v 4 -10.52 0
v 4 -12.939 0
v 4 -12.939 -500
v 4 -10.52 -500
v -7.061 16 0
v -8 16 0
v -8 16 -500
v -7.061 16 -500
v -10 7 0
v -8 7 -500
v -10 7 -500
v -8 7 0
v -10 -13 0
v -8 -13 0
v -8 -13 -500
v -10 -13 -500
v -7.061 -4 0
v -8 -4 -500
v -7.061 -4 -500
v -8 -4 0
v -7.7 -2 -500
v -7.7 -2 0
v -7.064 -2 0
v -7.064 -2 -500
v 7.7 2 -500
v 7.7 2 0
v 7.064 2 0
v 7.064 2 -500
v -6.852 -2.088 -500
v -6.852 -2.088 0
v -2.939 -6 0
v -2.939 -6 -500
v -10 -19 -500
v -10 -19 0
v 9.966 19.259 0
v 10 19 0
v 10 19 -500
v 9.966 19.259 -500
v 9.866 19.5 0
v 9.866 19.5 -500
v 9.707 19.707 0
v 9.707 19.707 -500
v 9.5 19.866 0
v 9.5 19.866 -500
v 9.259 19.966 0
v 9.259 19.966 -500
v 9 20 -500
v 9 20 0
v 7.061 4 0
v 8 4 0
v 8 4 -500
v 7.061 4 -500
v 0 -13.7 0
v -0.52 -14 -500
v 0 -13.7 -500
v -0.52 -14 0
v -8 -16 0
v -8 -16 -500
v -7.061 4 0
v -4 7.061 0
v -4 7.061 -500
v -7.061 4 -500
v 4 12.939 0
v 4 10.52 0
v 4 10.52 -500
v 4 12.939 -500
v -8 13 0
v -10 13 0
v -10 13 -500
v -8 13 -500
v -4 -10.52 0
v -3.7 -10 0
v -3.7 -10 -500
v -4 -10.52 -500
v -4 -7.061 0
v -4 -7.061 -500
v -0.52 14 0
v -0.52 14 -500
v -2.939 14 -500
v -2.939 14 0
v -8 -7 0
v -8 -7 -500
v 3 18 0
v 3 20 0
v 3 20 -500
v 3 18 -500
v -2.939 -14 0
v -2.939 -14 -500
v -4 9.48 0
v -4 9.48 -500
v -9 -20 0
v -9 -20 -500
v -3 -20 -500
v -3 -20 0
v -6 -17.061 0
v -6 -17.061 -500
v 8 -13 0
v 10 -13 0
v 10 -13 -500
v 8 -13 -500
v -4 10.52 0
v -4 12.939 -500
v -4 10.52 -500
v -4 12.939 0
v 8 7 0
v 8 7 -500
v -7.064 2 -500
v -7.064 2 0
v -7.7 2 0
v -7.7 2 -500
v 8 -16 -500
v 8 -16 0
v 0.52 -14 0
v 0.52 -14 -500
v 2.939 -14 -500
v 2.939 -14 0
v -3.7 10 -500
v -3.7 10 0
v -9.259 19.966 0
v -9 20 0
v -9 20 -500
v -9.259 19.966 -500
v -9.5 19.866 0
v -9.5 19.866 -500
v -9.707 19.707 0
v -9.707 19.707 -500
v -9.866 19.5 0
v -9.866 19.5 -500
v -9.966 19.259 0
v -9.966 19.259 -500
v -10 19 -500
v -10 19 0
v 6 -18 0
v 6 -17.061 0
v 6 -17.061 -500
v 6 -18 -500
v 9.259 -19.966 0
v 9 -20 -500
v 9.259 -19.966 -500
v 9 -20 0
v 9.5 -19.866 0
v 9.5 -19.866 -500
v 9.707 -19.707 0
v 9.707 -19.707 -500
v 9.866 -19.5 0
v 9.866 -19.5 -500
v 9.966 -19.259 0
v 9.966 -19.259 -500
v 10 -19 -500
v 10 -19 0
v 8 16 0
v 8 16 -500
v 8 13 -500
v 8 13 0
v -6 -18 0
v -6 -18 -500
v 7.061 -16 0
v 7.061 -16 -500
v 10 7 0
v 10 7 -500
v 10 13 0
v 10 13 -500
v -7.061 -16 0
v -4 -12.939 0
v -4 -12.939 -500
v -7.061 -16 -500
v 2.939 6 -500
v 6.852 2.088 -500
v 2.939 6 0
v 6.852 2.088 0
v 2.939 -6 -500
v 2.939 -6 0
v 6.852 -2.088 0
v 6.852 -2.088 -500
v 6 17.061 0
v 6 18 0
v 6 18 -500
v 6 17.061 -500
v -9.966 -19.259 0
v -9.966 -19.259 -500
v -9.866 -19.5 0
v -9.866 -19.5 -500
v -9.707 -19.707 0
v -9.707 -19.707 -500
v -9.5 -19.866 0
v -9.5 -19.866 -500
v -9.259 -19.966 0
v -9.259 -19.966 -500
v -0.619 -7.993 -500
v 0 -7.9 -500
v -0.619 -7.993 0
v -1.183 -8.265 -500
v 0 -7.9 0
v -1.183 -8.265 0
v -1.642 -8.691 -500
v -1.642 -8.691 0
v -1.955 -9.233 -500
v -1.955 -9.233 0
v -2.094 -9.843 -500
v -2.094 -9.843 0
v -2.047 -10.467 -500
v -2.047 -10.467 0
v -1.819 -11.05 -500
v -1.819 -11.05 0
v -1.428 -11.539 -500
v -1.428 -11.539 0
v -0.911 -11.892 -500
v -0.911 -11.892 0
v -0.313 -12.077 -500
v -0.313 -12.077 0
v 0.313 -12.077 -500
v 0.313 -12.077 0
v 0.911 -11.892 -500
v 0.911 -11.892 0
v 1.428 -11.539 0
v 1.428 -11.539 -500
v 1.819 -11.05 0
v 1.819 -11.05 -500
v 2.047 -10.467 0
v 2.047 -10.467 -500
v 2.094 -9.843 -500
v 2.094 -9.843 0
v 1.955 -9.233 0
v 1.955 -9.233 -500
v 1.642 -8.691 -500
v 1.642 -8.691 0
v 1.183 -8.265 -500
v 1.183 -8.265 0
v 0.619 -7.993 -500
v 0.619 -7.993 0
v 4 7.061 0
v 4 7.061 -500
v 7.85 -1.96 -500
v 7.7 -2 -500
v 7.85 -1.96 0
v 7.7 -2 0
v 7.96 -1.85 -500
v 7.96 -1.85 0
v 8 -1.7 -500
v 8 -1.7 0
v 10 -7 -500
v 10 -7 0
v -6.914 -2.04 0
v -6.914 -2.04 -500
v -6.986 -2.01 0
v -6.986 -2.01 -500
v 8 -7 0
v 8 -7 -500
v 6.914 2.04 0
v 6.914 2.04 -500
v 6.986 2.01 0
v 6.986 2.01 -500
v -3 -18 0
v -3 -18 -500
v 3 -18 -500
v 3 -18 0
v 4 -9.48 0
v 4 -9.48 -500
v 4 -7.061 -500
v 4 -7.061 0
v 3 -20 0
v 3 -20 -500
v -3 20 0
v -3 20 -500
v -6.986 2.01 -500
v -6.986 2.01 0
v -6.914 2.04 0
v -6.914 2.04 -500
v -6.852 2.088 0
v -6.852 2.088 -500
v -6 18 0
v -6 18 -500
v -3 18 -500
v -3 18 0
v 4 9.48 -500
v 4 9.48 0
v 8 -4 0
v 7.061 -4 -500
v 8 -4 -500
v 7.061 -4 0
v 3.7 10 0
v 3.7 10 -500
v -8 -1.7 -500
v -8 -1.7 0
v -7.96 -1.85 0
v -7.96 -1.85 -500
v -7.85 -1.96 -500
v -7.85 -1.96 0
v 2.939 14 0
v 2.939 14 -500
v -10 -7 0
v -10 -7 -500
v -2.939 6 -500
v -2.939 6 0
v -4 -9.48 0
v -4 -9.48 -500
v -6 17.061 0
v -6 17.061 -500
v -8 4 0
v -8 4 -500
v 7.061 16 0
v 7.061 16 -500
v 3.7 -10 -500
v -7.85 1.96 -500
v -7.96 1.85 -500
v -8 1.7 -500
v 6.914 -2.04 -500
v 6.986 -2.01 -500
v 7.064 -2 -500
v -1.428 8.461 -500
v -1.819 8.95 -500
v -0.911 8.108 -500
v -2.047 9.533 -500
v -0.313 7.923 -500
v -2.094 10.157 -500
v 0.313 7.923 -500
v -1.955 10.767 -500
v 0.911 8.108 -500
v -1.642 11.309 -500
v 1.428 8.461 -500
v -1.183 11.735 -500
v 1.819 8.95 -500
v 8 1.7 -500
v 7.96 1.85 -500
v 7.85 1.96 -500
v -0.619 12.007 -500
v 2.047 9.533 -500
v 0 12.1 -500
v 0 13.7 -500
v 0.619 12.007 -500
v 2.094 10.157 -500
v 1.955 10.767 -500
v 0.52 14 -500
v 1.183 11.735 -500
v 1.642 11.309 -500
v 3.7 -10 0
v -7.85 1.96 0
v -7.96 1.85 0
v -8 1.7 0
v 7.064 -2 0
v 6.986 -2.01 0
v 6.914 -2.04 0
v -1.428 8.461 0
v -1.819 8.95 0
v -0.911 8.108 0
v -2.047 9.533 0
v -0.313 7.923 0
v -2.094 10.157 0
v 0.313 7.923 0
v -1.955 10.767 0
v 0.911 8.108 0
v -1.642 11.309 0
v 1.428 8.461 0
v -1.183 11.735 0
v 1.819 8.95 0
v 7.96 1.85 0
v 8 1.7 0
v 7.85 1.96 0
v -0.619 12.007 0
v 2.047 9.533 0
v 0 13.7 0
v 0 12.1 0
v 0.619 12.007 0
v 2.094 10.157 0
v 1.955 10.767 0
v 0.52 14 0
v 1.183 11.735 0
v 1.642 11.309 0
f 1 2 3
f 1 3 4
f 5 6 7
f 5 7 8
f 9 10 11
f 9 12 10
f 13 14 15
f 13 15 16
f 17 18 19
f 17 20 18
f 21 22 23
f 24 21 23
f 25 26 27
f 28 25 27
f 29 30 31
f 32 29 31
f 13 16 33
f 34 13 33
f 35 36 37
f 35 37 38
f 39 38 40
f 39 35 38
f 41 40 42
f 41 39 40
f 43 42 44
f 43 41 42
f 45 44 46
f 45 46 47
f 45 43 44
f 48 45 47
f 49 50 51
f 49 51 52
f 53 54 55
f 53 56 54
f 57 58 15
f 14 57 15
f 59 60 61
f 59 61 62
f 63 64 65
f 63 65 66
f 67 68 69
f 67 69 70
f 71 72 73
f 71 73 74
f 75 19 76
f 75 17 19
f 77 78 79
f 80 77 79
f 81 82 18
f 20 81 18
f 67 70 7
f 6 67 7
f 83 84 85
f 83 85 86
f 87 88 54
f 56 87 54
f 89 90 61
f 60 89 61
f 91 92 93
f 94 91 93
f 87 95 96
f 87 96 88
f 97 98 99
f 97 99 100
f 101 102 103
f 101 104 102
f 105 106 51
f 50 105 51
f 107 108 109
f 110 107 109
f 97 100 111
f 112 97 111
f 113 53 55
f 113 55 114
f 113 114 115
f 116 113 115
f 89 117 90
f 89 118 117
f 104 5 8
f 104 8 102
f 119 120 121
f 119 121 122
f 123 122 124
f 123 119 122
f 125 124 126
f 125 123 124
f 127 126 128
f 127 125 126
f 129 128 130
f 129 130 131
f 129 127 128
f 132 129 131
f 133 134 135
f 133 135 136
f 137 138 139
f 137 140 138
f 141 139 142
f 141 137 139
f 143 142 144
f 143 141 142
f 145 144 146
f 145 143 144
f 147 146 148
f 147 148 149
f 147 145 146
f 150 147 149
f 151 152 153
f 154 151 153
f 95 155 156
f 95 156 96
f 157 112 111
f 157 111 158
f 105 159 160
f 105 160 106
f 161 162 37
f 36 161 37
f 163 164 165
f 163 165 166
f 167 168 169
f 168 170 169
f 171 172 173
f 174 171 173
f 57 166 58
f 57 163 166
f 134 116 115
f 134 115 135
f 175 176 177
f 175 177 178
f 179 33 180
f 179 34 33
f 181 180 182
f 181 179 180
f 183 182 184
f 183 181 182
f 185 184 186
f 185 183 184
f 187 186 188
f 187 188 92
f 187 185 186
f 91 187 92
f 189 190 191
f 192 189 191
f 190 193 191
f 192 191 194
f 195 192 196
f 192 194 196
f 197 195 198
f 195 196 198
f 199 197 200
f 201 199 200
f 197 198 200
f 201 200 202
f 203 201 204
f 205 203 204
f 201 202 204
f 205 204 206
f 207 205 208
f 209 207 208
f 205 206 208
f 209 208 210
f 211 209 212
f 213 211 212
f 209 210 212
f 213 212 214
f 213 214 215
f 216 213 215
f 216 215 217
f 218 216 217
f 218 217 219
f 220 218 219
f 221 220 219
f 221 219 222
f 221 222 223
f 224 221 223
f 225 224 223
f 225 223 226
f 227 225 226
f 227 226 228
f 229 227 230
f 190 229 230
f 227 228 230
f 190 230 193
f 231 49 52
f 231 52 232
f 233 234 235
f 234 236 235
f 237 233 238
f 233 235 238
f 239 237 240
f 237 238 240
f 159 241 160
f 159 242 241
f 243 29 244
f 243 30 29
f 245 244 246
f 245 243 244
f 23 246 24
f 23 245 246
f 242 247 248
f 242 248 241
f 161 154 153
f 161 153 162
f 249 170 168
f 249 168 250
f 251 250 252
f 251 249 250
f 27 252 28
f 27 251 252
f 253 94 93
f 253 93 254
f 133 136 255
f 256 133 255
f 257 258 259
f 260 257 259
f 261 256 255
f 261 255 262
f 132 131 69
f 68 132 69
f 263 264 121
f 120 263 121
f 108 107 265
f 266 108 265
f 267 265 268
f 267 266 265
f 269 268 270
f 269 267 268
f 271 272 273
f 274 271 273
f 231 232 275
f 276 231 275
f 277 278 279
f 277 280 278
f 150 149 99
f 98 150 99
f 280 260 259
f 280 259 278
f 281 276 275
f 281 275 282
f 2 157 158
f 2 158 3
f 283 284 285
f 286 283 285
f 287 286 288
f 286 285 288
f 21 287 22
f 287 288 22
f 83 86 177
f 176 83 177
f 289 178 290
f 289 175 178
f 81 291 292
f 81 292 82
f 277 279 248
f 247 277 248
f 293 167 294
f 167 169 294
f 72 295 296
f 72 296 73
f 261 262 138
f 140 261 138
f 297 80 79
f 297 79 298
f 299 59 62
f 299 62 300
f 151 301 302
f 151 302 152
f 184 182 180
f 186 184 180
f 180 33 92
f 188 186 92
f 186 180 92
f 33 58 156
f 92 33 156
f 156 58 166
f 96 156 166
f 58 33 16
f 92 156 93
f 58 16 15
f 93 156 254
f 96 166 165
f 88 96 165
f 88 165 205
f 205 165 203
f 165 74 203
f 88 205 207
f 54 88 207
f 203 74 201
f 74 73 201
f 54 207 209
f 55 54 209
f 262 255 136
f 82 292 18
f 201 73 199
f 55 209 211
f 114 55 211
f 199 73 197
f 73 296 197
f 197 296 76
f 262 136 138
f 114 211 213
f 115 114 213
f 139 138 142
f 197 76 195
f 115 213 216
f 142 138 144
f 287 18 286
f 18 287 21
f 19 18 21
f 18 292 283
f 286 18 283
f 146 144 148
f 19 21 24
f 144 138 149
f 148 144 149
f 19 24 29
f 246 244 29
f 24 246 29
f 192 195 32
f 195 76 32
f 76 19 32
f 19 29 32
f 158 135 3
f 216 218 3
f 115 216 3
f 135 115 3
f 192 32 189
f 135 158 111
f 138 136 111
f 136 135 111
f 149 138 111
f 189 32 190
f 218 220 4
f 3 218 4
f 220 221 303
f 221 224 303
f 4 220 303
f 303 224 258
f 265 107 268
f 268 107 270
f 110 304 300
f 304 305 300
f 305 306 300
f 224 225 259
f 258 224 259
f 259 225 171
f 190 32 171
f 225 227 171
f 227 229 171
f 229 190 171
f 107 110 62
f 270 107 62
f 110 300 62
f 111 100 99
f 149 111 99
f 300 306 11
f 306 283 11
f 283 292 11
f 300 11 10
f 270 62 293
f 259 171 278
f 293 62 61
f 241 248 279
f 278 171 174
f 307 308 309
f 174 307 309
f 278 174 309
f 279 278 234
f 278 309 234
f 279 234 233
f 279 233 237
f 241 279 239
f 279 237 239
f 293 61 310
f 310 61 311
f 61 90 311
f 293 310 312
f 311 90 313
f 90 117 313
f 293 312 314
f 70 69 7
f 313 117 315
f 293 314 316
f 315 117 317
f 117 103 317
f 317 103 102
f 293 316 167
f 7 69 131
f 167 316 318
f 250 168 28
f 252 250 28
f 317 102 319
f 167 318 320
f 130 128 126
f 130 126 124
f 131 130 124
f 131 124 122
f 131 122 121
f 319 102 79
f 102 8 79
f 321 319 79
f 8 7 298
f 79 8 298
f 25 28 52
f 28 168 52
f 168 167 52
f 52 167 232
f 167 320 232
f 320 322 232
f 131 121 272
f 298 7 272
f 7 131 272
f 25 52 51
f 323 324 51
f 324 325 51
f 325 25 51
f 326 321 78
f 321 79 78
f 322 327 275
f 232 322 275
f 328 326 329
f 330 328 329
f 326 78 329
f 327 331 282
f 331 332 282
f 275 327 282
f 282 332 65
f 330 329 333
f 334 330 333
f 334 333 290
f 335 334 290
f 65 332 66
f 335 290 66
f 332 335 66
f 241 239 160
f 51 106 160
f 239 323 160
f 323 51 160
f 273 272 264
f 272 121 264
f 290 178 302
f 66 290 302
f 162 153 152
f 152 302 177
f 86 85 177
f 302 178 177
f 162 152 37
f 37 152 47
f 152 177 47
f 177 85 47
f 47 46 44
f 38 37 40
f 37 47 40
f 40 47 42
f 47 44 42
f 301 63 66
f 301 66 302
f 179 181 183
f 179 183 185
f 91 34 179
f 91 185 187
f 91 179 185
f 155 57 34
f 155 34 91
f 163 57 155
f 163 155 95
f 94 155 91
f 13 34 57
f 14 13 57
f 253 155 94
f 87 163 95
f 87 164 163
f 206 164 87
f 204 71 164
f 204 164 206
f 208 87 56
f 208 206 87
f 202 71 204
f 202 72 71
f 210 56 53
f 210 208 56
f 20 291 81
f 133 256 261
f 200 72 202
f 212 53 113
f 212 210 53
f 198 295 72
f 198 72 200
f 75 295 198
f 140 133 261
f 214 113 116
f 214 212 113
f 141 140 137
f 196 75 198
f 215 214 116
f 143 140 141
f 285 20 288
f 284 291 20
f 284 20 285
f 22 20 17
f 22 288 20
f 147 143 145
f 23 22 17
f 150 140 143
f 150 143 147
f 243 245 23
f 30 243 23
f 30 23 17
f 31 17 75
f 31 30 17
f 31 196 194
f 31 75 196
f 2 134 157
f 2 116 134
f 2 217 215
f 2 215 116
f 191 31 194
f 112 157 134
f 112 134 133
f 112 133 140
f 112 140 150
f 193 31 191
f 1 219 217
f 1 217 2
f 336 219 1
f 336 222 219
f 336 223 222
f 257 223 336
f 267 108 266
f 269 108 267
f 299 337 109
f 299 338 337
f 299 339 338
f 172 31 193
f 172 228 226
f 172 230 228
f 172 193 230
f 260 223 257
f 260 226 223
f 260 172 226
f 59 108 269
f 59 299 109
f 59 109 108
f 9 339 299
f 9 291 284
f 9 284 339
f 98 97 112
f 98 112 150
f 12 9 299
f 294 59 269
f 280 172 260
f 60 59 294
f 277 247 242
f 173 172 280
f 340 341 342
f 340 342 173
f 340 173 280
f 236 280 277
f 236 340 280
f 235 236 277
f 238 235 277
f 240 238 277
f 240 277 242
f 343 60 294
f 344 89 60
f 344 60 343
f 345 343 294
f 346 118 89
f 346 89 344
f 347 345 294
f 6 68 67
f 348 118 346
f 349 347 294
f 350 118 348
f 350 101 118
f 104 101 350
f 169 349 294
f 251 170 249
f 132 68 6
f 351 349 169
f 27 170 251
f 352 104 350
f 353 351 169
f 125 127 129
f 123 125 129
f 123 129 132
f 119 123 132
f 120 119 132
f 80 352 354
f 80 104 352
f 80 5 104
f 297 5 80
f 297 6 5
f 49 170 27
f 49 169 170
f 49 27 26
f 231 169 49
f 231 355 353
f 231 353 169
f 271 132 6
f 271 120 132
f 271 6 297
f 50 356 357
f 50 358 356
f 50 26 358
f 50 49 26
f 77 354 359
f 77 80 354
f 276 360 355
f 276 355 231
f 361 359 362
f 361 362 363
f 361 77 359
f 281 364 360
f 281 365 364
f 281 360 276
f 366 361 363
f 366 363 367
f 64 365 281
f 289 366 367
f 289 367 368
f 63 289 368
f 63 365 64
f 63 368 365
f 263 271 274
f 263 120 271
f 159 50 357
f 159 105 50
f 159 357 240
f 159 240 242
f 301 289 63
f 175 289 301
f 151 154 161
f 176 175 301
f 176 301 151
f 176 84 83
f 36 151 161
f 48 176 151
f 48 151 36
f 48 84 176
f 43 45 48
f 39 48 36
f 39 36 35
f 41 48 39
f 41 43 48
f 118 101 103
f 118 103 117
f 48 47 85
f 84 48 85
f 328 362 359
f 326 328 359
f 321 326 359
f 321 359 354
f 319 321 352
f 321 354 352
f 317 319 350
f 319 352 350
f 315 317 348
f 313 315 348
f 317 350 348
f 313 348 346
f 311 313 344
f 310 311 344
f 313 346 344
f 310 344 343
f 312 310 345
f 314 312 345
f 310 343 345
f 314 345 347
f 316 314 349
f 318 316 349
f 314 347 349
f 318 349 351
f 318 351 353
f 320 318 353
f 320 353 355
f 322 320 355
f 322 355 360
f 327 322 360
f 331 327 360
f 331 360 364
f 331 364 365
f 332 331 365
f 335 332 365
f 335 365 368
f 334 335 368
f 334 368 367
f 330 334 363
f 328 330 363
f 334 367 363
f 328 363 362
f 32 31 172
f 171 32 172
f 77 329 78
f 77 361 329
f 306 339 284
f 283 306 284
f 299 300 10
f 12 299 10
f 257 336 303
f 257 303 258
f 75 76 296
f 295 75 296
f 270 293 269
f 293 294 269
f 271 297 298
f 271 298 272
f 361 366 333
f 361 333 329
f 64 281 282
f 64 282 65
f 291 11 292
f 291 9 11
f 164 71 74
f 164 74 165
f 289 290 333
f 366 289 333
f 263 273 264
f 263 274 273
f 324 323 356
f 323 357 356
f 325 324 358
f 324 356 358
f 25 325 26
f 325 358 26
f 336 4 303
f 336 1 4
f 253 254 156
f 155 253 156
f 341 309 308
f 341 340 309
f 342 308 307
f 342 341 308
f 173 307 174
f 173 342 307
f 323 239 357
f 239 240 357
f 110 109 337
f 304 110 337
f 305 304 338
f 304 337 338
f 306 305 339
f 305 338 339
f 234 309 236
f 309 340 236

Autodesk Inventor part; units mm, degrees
sketch "Sketch_1" plane through (0, 0, 0) normal (0, 0, 1) x (1, 0, 0)
  line L0 (-10, -7) -> (-8, -7)
  line L1 (-8, -7) -> (-8, -4)
  line L2 (-8, -4) -> (-7.0607, -4)
  line L3 (-7.0607, -4) -> (-4, -7.0607)
  line L4 (-4, -7.0607) -> (-4, -9.4804)
  line L5 (-4, -9.4804) -> (-3.7, -10)
  line L6 (-3.7, -10) -> (-4, -10.5196)
  line L7 (-4, -10.5196) -> (-4, -12.9393)
  line L8 (-4, -12.9393) -> (-7.0607, -16)
  line L9 (-7.0607, -16) -> (-8, -16)
  line L10 (-8, -16) -> (-8, -13)
  line L11 (-8, -13) -> (-10, -13)
  line L12 (-10, -13) -> (-10, -19)
  arc A0 (-10, -19) -> (-9, -20) centre (-9, -19) ccw
  line L13 (-9, -20) -> (-3, -20)
  line L14 (-3, -20) -> (-3, -18)
  line L15 (-3, -18) -> (-6, -18)
  line L16 (-6, -18) -> (-6, -17.0607)
  line L17 (-6, -17.0607) -> (-2.9393, -14)
  line L18 (-2.9393, -14) -> (-0.5196, -14)
  line L19 (-0.5196, -14) -> (0, -13.7)
  line L20 (0, -13.7) -> (0.5196, -14)
  line L21 (0.5196, -14) -> (2.9393, -14)
  line L22 (2.9393, -14) -> (6, -17.0607)
  line L23 (6, -17.0607) -> (6, -18)
  line L24 (6, -18) -> (3, -18)
  line L25 (3, -18) -> (3, -20)
  line L26 (3, -20) -> (9, -20)
  arc A1 (9, -20) -> (10, -19) centre (9, -19) ccw
  line L27 (10, -19) -> (10, -13)
  line L28 (10, -13) -> (8, -13)
  line L29 (8, -13) -> (8, -16)
  line L30 (8, -16) -> (7.0607, -16)
  line L31 (7.0607, -16) -> (4, -12.9393)
  line L32 (4, -12.9393) -> (4, -10.5196)
  line L33 (4, -10.5196) -> (3.7, -10)
  line L34 (3.7, -10) -> (4, -9.4804)
  line L35 (4, -9.4804) -> (4, -7.0607)
  line L36 (4, -7.0607) -> (7.0607, -4)
  line L37 (7.0607, -4) -> (8, -4)
  line L38 (8, -4) -> (8, -7)
  line L39 (8, -7) -> (10, -7)
  line L40 (10, -7) -> (10, 7)
  line L41 (10, 7) -> (8, 7)
  line L42 (8, 7) -> (8, 4)
  line L43 (8, 4) -> (7.0607, 4)
  line L44 (7.0607, 4) -> (4, 7.0607)
  line L45 (4, 7.0607) -> (4, 9.4804)
  line L46 (4, 9.4804) -> (3.7, 10)
  line L47 (3.7, 10) -> (4, 10.5196)
  line L48 (4, 10.5196) -> (4, 12.9393)
  line L49 (4, 12.9393) -> (7.0607, 16)
  line L50 (7.0607, 16) -> (8, 16)
  line L51 (8, 16) -> (8, 13)
  line L52 (8, 13) -> (10, 13)
  line L53 (10, 13) -> (10, 19)
  arc A2 (10, 19) -> (9, 20) centre (9, 19) ccw
  line L54 (9, 20) -> (3, 20)
  line L55 (3, 20) -> (3, 18)
  line L56 (3, 18) -> (6, 18)
  line L57 (6, 18) -> (6, 17.0607)
  line L58 (6, 17.0607) -> (2.9393, 14)
  line L59 (2.9393, 14) -> (0.5196, 14)
  line L60 (0.5196, 14) -> (0, 13.7)
  line L61 (0, 13.7) -> (-0.5196, 14)
  line L62 (-0.5196, 14) -> (-2.9393, 14)
  line L63 (-2.9393, 14) -> (-6, 17.0607)
  line L64 (-6, 17.0607) -> (-6, 18)
  line L65 (-6, 18) -> (-3, 18)
  line L66 (-3, 18) -> (-3, 20)
  line L67 (-3, 20) -> (-9, 20)
  arc A3 (-9, 20) -> (-10, 19) centre (-9, 19) ccw
  line L68 (-10, 19) -> (-10, 13)
  line L69 (-10, 13) -> (-8, 13)
  line L70 (-8, 13) -> (-8, 16)
  line L71 (-8, 16) -> (-7.0607, 16)
  line L72 (-7.0607, 16) -> (-4, 12.9393)
  line L73 (-4, 12.9393) -> (-4, 10.5196)
  line L74 (-4, 10.5196) -> (-3.7, 10)
  line L75 (-3.7, 10) -> (-4, 9.4804)
  line L76 (-4, 9.4804) -> (-4, 7.0607)
  line L77 (-4, 7.0607) -> (-7.0607, 4)
  line L78 (-7.0607, 4) -> (-8, 4)
  line L79 (-8, 4) -> (-8, 7)
  line L80 (-8, 7) -> (-10, 7)
  line L81 (-10, 7) -> (-10, -7)
  line L82 (-8, 1.7) -> (-8, -1.7)
  arc A4 (-8, -1.7) -> (-7.7, -2) centre (-7.7, -1.7) ccw
  line L83 (-7.7, -2) -> (-7.0636, -2)
  arc A5 (-6.8515, -2.0879) -> (-7.0636, -2) centre (-7.0636, -2.3) ccw
  line L84 (-6.8515, -2.0879) -> (-2.9393, -6)
  line L85 (-2.9393, -6) -> (2.9393, -6)
  line L86 (2.9393, -6) -> (6.8515, -2.0879)
  arc A6 (7.0636, -2) -> (6.8515, -2.0879) centre (7.0636, -2.3) ccw
  line L87 (7.0636, -2) -> (7.7, -2)
  arc A7 (7.7, -2) -> (8, -1.7) centre (7.7, -1.7) ccw
  line L88 (8, -1.7) -> (8, 1.7)
  arc A8 (8, 1.7) -> (7.7, 2) centre (7.7, 1.7) ccw
  line L89 (7.7, 2) -> (7.0636, 2)
  arc A9 (6.8515, 2.0879) -> (7.0636, 2) centre (7.0636, 2.3) ccw
  line L90 (6.8515, 2.0879) -> (2.9393, 6)
  line L91 (2.9393, 6) -> (-2.9393, 6)
  line L92 (-2.9393, 6) -> (-6.8515, 2.0879)
  arc A10 (-7.0636, 2) -> (-6.8515, 2.0879) centre (-7.0636, 2.3) ccw
  line L93 (-7.0636, 2) -> (-7.7, 2)
  arc A11 (-7.7, 2) -> (-8, 1.7) centre (-7.7, 1.7) ccw
extrude "Extrusion1" add sketch "Sketch_1" against normal blind 500
sketch "Sketch2" plane through (0, 0, -500) normal (0, 0, -1) x (-1, 0, 0)
  point P0 (0, 10)
hole "Hole1" at (0, 10, -500) direction (0, 0, 1) diameter 4.2 depth 500
pattern_linear "Rectangular Pattern1" count 2 spacing 20 along (0, -1, 0) of "Hole1"
ref_plane "C1_XY" through (0, 0, 0) normal (0, 0, 1) x (1, 0, 0)
ref_plane "C1_YZ" through (0, 0, 0) normal (1, 0, 0) x (0, 1, 0)
ref_plane "C1_ZX" through (0, 0, 0) normal (0, 1, 0) x (0, 0, 1)
properties part number "HFS5-2040-500"
